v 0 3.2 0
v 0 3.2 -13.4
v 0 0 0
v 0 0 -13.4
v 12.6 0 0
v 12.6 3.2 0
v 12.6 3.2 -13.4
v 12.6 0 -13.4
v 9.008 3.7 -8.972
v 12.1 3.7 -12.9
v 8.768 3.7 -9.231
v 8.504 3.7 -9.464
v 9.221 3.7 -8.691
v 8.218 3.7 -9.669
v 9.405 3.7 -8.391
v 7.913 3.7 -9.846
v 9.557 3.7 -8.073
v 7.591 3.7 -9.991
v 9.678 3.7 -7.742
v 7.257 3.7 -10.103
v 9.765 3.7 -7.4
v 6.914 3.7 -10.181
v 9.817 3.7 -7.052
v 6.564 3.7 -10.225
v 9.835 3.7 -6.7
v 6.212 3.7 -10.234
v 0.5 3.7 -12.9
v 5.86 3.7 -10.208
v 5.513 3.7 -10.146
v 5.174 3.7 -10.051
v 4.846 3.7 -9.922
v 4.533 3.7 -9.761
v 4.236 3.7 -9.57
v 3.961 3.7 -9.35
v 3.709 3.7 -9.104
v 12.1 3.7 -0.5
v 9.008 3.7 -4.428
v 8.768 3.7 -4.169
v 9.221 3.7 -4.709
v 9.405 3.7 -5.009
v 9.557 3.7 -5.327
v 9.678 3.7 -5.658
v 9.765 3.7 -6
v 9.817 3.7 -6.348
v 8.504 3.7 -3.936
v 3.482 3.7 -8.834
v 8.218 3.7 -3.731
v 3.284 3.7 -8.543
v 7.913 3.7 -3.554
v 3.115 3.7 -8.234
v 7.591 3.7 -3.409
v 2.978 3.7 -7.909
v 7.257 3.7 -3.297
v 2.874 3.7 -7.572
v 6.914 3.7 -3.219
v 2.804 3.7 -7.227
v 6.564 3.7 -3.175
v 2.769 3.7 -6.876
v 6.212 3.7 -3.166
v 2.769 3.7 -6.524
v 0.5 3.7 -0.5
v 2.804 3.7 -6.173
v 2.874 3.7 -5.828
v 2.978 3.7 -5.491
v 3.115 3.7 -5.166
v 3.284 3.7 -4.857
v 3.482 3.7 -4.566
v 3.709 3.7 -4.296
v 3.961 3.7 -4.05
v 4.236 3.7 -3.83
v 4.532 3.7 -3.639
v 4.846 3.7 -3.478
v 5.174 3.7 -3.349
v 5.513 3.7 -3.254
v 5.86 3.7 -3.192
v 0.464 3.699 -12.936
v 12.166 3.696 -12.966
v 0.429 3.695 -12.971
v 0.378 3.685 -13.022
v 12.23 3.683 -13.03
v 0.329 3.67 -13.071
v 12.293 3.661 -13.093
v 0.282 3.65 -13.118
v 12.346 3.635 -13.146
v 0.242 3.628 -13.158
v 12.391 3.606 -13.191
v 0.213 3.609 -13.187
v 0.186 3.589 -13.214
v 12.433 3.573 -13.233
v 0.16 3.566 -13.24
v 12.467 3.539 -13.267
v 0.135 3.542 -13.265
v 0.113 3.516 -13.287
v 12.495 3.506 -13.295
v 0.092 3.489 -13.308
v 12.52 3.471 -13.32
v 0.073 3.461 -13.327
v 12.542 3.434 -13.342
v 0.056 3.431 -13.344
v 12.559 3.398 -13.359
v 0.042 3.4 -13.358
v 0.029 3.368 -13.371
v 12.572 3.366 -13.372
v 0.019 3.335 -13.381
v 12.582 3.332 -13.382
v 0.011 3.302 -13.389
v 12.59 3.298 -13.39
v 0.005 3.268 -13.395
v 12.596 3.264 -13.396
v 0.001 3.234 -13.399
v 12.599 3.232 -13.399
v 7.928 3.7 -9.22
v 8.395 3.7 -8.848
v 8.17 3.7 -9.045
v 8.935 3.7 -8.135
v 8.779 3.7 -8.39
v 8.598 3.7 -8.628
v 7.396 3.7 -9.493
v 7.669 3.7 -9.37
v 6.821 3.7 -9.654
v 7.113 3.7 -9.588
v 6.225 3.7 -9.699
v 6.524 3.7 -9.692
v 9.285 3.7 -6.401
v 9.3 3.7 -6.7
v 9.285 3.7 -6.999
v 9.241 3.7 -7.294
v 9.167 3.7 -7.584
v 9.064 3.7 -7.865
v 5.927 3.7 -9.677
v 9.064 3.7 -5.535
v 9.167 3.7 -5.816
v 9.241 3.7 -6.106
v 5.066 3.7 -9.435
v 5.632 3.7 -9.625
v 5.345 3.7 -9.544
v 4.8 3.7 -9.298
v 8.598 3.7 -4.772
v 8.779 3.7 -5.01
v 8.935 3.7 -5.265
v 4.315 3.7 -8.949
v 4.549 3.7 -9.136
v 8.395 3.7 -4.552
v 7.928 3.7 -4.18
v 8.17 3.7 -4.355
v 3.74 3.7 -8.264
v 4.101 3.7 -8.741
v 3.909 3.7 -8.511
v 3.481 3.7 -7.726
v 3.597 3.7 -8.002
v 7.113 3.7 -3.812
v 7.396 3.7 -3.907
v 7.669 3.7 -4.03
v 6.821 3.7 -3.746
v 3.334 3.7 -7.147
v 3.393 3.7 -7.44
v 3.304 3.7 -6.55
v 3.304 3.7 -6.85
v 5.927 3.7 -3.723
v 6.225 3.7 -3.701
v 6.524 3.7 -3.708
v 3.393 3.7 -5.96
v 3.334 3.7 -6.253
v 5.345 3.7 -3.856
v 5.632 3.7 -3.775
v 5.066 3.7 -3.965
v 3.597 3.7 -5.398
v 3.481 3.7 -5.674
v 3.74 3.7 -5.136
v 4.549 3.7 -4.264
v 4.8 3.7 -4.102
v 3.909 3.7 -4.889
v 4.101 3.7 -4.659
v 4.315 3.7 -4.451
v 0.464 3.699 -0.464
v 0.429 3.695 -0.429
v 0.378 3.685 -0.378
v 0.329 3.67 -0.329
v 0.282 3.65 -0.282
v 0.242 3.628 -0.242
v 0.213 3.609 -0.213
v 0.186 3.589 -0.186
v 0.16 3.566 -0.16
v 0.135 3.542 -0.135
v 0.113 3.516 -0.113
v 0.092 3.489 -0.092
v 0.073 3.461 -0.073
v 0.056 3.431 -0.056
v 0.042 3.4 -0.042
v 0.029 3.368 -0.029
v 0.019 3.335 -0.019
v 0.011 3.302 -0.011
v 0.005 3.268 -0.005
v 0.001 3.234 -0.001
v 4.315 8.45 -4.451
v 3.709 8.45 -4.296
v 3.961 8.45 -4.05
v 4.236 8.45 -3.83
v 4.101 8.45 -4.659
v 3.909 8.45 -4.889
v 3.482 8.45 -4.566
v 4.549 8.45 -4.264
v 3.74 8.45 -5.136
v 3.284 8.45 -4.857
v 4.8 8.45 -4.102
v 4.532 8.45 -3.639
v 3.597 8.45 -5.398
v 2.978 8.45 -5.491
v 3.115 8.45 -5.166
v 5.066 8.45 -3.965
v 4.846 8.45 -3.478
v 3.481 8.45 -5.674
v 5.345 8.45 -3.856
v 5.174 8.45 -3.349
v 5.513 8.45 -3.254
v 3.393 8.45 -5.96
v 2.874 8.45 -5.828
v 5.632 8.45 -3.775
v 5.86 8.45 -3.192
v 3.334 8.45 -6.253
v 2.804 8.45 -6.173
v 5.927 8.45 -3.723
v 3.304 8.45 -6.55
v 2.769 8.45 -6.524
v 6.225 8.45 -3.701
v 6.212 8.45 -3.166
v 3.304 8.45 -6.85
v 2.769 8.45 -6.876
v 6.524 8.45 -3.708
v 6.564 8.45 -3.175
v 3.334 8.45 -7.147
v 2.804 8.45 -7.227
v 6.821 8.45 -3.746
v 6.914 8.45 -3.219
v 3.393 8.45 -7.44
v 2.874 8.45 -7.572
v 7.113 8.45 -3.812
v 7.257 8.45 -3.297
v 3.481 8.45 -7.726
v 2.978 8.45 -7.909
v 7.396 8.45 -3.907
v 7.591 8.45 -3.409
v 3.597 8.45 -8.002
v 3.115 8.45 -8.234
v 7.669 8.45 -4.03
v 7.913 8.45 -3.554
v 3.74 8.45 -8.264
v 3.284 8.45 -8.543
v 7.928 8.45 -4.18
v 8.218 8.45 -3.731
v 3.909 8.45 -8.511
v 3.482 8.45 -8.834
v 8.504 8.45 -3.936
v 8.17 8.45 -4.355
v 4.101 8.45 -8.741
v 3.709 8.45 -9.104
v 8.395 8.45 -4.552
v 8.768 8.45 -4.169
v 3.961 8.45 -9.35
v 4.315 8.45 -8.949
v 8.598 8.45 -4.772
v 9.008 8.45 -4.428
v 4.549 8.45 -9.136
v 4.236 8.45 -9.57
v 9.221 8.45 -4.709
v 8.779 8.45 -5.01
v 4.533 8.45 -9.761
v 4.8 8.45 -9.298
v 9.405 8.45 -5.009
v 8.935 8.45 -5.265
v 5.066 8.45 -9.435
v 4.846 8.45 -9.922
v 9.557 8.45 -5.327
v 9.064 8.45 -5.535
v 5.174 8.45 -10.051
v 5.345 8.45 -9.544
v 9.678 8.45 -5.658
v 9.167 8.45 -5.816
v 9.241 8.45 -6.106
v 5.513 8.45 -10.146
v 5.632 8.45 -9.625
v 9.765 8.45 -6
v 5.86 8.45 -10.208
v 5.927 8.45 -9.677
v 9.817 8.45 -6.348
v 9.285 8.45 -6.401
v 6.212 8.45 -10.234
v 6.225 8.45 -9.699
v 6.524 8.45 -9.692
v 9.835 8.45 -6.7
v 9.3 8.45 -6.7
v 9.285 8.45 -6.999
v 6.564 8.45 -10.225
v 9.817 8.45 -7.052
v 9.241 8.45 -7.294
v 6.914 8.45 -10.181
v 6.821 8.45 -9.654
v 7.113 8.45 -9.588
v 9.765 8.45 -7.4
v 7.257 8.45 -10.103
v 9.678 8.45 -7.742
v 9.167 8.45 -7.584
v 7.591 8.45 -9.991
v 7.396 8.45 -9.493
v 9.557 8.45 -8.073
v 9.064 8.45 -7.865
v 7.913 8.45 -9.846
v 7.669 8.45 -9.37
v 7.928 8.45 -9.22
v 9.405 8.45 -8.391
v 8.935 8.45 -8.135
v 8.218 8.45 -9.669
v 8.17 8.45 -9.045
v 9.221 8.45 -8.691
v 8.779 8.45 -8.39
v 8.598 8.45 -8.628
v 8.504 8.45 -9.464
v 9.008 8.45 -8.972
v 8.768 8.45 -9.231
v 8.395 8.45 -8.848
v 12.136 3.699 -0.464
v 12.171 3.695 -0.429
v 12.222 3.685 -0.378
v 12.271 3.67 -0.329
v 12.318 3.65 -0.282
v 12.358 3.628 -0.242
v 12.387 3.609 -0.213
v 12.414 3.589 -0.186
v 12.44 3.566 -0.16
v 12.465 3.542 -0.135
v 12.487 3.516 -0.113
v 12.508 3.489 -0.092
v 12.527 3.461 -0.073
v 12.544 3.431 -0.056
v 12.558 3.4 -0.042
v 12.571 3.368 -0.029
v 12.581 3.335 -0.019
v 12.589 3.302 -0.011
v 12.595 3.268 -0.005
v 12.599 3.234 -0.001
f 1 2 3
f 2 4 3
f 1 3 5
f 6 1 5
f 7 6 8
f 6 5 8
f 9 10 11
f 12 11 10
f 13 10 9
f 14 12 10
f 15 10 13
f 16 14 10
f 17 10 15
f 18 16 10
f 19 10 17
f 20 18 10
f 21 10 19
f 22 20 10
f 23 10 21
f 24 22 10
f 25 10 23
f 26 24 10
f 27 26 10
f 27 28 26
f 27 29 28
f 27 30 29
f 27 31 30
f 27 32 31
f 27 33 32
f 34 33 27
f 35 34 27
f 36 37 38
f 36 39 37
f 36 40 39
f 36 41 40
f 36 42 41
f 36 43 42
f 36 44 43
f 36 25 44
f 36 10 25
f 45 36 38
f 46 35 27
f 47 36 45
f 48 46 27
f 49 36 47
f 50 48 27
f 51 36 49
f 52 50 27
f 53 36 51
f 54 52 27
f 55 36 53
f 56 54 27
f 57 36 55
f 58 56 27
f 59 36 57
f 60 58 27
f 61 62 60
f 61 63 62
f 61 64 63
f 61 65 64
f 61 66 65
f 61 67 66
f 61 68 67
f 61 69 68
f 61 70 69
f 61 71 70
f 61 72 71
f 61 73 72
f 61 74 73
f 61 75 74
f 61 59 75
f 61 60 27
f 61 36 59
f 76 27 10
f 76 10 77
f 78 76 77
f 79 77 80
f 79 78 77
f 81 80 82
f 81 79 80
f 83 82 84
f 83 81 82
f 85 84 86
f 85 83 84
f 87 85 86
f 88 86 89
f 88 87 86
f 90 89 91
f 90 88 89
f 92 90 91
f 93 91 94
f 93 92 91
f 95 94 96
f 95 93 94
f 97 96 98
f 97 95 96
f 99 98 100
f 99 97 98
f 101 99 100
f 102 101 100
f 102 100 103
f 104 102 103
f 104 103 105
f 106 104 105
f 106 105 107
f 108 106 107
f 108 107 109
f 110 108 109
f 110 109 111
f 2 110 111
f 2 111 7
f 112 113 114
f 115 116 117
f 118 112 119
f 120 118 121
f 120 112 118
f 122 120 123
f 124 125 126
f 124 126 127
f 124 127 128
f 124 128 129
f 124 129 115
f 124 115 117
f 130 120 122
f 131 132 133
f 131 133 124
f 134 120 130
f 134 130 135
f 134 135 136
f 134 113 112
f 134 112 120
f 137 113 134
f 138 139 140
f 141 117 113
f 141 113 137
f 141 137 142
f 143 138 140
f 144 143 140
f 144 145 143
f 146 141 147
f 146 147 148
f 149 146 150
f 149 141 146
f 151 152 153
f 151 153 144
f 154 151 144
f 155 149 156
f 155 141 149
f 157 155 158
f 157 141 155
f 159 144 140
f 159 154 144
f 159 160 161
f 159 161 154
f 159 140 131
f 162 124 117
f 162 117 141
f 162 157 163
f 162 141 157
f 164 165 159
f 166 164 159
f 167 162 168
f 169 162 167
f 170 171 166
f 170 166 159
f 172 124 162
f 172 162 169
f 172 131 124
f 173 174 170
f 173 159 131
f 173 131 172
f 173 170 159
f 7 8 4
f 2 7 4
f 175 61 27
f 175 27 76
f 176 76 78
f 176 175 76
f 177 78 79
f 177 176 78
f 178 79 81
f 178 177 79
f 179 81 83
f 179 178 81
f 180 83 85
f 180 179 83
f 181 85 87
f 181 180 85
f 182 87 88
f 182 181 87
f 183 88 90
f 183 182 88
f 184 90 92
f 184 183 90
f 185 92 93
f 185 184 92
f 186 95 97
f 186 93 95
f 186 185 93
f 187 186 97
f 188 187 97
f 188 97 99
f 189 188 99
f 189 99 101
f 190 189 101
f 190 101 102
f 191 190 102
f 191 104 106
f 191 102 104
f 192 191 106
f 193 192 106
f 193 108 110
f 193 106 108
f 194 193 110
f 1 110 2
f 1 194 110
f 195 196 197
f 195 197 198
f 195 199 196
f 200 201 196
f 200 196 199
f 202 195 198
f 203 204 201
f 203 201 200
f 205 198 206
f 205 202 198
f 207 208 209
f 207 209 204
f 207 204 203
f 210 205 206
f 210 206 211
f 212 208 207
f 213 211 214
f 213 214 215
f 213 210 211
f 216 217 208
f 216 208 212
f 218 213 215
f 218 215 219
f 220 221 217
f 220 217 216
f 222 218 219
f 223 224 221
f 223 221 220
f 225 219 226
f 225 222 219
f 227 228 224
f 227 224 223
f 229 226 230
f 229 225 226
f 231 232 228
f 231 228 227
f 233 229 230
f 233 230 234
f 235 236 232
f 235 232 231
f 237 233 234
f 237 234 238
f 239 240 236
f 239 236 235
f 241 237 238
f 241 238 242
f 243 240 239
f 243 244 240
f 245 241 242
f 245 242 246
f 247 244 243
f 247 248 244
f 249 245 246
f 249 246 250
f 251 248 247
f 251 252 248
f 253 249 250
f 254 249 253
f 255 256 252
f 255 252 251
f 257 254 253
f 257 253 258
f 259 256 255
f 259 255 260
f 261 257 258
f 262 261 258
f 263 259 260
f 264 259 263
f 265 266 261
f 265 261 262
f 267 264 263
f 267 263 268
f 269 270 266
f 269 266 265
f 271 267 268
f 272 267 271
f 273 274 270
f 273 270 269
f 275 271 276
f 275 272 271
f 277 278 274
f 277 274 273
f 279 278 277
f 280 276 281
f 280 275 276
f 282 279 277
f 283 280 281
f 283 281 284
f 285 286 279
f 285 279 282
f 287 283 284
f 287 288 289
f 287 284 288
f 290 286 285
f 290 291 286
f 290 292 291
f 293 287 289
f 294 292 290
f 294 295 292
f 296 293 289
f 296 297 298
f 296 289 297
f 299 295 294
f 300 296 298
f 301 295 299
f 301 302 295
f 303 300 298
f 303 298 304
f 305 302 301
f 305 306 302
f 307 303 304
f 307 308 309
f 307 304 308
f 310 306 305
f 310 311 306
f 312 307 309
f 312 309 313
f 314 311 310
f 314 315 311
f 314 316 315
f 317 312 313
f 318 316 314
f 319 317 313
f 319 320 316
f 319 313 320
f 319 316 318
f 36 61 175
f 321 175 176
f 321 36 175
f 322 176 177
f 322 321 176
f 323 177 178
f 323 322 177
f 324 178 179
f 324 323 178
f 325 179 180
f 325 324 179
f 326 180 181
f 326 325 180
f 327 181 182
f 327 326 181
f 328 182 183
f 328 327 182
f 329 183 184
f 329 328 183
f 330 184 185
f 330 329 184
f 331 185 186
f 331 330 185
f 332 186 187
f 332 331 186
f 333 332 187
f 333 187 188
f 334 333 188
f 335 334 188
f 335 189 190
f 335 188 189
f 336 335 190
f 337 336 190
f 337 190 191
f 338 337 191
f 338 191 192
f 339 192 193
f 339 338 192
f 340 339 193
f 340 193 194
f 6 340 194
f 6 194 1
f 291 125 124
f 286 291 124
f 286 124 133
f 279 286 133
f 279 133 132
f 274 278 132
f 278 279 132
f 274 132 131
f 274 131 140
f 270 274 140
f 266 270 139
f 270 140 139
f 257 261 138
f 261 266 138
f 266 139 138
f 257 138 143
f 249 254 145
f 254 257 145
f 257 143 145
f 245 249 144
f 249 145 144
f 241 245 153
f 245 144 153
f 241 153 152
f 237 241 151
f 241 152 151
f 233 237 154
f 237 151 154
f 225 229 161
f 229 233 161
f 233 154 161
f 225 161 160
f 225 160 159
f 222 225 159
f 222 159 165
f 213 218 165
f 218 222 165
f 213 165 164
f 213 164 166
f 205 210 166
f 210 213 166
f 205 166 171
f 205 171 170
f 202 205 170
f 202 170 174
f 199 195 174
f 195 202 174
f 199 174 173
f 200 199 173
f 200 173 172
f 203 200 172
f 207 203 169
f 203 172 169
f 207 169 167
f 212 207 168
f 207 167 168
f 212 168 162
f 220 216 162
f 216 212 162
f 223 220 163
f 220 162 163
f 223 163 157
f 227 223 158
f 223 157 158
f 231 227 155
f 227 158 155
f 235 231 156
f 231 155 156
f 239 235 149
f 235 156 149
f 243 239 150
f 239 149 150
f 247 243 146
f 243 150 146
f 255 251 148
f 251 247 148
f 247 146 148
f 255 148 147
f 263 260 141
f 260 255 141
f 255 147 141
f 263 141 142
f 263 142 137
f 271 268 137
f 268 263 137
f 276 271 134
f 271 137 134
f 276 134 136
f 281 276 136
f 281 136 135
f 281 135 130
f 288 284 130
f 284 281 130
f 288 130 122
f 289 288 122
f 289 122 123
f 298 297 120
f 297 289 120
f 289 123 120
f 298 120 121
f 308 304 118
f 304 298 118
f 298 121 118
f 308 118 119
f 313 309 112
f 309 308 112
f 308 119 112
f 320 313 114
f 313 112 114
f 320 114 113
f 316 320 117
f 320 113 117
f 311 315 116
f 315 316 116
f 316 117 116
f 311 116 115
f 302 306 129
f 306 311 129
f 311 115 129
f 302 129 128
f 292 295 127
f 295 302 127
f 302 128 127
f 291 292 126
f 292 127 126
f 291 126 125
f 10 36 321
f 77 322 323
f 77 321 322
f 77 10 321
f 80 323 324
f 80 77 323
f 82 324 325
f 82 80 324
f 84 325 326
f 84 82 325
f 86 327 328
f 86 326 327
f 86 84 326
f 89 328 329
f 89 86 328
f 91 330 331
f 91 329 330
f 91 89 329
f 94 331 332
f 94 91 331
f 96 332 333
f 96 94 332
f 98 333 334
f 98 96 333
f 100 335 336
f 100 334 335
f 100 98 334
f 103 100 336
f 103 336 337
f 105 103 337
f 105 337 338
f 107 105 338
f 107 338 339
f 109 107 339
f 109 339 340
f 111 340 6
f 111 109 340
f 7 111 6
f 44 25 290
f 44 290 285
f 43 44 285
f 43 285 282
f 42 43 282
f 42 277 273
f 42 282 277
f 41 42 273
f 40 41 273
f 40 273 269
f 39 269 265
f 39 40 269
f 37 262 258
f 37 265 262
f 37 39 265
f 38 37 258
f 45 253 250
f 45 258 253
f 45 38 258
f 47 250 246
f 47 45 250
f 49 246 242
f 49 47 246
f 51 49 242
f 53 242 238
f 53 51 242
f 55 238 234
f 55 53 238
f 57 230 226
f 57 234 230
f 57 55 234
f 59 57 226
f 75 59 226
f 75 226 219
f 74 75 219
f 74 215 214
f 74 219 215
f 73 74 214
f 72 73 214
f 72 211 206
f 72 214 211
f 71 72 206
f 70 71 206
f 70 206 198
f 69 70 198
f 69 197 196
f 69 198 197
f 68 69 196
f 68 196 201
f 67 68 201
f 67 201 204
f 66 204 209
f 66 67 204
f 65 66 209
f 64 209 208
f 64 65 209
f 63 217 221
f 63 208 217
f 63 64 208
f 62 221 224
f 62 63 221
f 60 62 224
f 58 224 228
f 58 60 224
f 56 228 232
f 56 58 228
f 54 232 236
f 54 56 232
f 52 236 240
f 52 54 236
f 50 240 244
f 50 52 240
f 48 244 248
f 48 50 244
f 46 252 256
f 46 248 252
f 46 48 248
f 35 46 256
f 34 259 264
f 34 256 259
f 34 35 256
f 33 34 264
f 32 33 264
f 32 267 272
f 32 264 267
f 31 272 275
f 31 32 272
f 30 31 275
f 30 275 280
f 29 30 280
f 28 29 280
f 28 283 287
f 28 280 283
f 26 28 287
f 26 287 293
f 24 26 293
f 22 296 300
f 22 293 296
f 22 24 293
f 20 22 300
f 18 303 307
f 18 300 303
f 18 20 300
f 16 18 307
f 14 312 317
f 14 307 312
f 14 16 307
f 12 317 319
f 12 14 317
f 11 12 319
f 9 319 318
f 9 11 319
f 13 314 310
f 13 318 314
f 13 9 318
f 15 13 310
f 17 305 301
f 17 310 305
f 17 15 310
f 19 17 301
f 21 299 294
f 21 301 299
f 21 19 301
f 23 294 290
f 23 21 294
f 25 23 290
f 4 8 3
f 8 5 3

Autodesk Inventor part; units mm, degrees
ref_plane "YZ Plane" through (0, 0, 0) normal (1, 0, 0) x (0, 1, 0)
ref_plane "XZ Plane" through (0, 0, 0) normal (0, 1, 0) x (-1, 0, 0)
ref_plane "XY Plane" through (0, 0, 0) normal (0, 0, 1) x (1, 0, 0)
sketch "Sketch1" plane through (0, 0, 0) normal (0, 1, 0) x (-1, 0, 0)
  line L0 (0, 0) -> (-12.6, 0)
  line L1 (-12.6, 0) -> (-12.6, -13.4)
  line L2 (-12.6, -13.4) -> (0, -13.4)
  line L3 (0, -13.4) -> (0, 0)
  dimension "d0" = 12.6
  dimension "d1" = 13.4
extrude "Extrusion1" add sketch "Sketch1" along normal blind 3.7
sketch "Sketch2" plane through (0, 3.7, 0) normal (0, 1, 0) x (1, 0, 0)
  circle A0 centre (6.3, 6.7) radius 3.535
  line L0 (12.6, 13.4) -> (0, 13.4) projected
  line L1 (12.6, 0) -> (12.6, 13.4) projected
  circle A1 centre (6.3, 6.7) radius 3
  point P0 (0, 0)
  point P1 (6.3, 13.4)
  point P2 (12.6, 6.7)
  dimension "d4" = 7.07
  dimension "d17" = 6
extrude "Extrusion2" add sketch "Sketch2" along normal blind 4.75
fillet "Fillet1" radius 0.5 4 edges at (6.3, 3.7, 0) (12.6, 3.7, -6.7) (6.3, 3.7, -13.4) (0, 3.7, -6.7)
sketch "Sketch3" plane through (6.3, 8.45, -6.7) normal (0, 1, 0) x (1, 0, 0)
  circle A0 centre (0, 0) radius 3
  circle A1 centre (0, 0) radius 3.535 projected
  point P0 (-6.3, -6.7)
  dimension "d7" = 6
sketch "Sketch4" plane through (6.3, 15.9, -6.7) normal (0, 1, 0) x (1, 0, 0)
  line L0 (1.46, 3.1507) -> (1.46, -2.6208)
  circle A0 centre (0, 0) radius 3 construction
  point P0 (-6.3, -6.7)
  point P1 (-3, 0)
  dimension "d13" = 4.46
properties part number "PEC12R-4017F-N0024 Base"
